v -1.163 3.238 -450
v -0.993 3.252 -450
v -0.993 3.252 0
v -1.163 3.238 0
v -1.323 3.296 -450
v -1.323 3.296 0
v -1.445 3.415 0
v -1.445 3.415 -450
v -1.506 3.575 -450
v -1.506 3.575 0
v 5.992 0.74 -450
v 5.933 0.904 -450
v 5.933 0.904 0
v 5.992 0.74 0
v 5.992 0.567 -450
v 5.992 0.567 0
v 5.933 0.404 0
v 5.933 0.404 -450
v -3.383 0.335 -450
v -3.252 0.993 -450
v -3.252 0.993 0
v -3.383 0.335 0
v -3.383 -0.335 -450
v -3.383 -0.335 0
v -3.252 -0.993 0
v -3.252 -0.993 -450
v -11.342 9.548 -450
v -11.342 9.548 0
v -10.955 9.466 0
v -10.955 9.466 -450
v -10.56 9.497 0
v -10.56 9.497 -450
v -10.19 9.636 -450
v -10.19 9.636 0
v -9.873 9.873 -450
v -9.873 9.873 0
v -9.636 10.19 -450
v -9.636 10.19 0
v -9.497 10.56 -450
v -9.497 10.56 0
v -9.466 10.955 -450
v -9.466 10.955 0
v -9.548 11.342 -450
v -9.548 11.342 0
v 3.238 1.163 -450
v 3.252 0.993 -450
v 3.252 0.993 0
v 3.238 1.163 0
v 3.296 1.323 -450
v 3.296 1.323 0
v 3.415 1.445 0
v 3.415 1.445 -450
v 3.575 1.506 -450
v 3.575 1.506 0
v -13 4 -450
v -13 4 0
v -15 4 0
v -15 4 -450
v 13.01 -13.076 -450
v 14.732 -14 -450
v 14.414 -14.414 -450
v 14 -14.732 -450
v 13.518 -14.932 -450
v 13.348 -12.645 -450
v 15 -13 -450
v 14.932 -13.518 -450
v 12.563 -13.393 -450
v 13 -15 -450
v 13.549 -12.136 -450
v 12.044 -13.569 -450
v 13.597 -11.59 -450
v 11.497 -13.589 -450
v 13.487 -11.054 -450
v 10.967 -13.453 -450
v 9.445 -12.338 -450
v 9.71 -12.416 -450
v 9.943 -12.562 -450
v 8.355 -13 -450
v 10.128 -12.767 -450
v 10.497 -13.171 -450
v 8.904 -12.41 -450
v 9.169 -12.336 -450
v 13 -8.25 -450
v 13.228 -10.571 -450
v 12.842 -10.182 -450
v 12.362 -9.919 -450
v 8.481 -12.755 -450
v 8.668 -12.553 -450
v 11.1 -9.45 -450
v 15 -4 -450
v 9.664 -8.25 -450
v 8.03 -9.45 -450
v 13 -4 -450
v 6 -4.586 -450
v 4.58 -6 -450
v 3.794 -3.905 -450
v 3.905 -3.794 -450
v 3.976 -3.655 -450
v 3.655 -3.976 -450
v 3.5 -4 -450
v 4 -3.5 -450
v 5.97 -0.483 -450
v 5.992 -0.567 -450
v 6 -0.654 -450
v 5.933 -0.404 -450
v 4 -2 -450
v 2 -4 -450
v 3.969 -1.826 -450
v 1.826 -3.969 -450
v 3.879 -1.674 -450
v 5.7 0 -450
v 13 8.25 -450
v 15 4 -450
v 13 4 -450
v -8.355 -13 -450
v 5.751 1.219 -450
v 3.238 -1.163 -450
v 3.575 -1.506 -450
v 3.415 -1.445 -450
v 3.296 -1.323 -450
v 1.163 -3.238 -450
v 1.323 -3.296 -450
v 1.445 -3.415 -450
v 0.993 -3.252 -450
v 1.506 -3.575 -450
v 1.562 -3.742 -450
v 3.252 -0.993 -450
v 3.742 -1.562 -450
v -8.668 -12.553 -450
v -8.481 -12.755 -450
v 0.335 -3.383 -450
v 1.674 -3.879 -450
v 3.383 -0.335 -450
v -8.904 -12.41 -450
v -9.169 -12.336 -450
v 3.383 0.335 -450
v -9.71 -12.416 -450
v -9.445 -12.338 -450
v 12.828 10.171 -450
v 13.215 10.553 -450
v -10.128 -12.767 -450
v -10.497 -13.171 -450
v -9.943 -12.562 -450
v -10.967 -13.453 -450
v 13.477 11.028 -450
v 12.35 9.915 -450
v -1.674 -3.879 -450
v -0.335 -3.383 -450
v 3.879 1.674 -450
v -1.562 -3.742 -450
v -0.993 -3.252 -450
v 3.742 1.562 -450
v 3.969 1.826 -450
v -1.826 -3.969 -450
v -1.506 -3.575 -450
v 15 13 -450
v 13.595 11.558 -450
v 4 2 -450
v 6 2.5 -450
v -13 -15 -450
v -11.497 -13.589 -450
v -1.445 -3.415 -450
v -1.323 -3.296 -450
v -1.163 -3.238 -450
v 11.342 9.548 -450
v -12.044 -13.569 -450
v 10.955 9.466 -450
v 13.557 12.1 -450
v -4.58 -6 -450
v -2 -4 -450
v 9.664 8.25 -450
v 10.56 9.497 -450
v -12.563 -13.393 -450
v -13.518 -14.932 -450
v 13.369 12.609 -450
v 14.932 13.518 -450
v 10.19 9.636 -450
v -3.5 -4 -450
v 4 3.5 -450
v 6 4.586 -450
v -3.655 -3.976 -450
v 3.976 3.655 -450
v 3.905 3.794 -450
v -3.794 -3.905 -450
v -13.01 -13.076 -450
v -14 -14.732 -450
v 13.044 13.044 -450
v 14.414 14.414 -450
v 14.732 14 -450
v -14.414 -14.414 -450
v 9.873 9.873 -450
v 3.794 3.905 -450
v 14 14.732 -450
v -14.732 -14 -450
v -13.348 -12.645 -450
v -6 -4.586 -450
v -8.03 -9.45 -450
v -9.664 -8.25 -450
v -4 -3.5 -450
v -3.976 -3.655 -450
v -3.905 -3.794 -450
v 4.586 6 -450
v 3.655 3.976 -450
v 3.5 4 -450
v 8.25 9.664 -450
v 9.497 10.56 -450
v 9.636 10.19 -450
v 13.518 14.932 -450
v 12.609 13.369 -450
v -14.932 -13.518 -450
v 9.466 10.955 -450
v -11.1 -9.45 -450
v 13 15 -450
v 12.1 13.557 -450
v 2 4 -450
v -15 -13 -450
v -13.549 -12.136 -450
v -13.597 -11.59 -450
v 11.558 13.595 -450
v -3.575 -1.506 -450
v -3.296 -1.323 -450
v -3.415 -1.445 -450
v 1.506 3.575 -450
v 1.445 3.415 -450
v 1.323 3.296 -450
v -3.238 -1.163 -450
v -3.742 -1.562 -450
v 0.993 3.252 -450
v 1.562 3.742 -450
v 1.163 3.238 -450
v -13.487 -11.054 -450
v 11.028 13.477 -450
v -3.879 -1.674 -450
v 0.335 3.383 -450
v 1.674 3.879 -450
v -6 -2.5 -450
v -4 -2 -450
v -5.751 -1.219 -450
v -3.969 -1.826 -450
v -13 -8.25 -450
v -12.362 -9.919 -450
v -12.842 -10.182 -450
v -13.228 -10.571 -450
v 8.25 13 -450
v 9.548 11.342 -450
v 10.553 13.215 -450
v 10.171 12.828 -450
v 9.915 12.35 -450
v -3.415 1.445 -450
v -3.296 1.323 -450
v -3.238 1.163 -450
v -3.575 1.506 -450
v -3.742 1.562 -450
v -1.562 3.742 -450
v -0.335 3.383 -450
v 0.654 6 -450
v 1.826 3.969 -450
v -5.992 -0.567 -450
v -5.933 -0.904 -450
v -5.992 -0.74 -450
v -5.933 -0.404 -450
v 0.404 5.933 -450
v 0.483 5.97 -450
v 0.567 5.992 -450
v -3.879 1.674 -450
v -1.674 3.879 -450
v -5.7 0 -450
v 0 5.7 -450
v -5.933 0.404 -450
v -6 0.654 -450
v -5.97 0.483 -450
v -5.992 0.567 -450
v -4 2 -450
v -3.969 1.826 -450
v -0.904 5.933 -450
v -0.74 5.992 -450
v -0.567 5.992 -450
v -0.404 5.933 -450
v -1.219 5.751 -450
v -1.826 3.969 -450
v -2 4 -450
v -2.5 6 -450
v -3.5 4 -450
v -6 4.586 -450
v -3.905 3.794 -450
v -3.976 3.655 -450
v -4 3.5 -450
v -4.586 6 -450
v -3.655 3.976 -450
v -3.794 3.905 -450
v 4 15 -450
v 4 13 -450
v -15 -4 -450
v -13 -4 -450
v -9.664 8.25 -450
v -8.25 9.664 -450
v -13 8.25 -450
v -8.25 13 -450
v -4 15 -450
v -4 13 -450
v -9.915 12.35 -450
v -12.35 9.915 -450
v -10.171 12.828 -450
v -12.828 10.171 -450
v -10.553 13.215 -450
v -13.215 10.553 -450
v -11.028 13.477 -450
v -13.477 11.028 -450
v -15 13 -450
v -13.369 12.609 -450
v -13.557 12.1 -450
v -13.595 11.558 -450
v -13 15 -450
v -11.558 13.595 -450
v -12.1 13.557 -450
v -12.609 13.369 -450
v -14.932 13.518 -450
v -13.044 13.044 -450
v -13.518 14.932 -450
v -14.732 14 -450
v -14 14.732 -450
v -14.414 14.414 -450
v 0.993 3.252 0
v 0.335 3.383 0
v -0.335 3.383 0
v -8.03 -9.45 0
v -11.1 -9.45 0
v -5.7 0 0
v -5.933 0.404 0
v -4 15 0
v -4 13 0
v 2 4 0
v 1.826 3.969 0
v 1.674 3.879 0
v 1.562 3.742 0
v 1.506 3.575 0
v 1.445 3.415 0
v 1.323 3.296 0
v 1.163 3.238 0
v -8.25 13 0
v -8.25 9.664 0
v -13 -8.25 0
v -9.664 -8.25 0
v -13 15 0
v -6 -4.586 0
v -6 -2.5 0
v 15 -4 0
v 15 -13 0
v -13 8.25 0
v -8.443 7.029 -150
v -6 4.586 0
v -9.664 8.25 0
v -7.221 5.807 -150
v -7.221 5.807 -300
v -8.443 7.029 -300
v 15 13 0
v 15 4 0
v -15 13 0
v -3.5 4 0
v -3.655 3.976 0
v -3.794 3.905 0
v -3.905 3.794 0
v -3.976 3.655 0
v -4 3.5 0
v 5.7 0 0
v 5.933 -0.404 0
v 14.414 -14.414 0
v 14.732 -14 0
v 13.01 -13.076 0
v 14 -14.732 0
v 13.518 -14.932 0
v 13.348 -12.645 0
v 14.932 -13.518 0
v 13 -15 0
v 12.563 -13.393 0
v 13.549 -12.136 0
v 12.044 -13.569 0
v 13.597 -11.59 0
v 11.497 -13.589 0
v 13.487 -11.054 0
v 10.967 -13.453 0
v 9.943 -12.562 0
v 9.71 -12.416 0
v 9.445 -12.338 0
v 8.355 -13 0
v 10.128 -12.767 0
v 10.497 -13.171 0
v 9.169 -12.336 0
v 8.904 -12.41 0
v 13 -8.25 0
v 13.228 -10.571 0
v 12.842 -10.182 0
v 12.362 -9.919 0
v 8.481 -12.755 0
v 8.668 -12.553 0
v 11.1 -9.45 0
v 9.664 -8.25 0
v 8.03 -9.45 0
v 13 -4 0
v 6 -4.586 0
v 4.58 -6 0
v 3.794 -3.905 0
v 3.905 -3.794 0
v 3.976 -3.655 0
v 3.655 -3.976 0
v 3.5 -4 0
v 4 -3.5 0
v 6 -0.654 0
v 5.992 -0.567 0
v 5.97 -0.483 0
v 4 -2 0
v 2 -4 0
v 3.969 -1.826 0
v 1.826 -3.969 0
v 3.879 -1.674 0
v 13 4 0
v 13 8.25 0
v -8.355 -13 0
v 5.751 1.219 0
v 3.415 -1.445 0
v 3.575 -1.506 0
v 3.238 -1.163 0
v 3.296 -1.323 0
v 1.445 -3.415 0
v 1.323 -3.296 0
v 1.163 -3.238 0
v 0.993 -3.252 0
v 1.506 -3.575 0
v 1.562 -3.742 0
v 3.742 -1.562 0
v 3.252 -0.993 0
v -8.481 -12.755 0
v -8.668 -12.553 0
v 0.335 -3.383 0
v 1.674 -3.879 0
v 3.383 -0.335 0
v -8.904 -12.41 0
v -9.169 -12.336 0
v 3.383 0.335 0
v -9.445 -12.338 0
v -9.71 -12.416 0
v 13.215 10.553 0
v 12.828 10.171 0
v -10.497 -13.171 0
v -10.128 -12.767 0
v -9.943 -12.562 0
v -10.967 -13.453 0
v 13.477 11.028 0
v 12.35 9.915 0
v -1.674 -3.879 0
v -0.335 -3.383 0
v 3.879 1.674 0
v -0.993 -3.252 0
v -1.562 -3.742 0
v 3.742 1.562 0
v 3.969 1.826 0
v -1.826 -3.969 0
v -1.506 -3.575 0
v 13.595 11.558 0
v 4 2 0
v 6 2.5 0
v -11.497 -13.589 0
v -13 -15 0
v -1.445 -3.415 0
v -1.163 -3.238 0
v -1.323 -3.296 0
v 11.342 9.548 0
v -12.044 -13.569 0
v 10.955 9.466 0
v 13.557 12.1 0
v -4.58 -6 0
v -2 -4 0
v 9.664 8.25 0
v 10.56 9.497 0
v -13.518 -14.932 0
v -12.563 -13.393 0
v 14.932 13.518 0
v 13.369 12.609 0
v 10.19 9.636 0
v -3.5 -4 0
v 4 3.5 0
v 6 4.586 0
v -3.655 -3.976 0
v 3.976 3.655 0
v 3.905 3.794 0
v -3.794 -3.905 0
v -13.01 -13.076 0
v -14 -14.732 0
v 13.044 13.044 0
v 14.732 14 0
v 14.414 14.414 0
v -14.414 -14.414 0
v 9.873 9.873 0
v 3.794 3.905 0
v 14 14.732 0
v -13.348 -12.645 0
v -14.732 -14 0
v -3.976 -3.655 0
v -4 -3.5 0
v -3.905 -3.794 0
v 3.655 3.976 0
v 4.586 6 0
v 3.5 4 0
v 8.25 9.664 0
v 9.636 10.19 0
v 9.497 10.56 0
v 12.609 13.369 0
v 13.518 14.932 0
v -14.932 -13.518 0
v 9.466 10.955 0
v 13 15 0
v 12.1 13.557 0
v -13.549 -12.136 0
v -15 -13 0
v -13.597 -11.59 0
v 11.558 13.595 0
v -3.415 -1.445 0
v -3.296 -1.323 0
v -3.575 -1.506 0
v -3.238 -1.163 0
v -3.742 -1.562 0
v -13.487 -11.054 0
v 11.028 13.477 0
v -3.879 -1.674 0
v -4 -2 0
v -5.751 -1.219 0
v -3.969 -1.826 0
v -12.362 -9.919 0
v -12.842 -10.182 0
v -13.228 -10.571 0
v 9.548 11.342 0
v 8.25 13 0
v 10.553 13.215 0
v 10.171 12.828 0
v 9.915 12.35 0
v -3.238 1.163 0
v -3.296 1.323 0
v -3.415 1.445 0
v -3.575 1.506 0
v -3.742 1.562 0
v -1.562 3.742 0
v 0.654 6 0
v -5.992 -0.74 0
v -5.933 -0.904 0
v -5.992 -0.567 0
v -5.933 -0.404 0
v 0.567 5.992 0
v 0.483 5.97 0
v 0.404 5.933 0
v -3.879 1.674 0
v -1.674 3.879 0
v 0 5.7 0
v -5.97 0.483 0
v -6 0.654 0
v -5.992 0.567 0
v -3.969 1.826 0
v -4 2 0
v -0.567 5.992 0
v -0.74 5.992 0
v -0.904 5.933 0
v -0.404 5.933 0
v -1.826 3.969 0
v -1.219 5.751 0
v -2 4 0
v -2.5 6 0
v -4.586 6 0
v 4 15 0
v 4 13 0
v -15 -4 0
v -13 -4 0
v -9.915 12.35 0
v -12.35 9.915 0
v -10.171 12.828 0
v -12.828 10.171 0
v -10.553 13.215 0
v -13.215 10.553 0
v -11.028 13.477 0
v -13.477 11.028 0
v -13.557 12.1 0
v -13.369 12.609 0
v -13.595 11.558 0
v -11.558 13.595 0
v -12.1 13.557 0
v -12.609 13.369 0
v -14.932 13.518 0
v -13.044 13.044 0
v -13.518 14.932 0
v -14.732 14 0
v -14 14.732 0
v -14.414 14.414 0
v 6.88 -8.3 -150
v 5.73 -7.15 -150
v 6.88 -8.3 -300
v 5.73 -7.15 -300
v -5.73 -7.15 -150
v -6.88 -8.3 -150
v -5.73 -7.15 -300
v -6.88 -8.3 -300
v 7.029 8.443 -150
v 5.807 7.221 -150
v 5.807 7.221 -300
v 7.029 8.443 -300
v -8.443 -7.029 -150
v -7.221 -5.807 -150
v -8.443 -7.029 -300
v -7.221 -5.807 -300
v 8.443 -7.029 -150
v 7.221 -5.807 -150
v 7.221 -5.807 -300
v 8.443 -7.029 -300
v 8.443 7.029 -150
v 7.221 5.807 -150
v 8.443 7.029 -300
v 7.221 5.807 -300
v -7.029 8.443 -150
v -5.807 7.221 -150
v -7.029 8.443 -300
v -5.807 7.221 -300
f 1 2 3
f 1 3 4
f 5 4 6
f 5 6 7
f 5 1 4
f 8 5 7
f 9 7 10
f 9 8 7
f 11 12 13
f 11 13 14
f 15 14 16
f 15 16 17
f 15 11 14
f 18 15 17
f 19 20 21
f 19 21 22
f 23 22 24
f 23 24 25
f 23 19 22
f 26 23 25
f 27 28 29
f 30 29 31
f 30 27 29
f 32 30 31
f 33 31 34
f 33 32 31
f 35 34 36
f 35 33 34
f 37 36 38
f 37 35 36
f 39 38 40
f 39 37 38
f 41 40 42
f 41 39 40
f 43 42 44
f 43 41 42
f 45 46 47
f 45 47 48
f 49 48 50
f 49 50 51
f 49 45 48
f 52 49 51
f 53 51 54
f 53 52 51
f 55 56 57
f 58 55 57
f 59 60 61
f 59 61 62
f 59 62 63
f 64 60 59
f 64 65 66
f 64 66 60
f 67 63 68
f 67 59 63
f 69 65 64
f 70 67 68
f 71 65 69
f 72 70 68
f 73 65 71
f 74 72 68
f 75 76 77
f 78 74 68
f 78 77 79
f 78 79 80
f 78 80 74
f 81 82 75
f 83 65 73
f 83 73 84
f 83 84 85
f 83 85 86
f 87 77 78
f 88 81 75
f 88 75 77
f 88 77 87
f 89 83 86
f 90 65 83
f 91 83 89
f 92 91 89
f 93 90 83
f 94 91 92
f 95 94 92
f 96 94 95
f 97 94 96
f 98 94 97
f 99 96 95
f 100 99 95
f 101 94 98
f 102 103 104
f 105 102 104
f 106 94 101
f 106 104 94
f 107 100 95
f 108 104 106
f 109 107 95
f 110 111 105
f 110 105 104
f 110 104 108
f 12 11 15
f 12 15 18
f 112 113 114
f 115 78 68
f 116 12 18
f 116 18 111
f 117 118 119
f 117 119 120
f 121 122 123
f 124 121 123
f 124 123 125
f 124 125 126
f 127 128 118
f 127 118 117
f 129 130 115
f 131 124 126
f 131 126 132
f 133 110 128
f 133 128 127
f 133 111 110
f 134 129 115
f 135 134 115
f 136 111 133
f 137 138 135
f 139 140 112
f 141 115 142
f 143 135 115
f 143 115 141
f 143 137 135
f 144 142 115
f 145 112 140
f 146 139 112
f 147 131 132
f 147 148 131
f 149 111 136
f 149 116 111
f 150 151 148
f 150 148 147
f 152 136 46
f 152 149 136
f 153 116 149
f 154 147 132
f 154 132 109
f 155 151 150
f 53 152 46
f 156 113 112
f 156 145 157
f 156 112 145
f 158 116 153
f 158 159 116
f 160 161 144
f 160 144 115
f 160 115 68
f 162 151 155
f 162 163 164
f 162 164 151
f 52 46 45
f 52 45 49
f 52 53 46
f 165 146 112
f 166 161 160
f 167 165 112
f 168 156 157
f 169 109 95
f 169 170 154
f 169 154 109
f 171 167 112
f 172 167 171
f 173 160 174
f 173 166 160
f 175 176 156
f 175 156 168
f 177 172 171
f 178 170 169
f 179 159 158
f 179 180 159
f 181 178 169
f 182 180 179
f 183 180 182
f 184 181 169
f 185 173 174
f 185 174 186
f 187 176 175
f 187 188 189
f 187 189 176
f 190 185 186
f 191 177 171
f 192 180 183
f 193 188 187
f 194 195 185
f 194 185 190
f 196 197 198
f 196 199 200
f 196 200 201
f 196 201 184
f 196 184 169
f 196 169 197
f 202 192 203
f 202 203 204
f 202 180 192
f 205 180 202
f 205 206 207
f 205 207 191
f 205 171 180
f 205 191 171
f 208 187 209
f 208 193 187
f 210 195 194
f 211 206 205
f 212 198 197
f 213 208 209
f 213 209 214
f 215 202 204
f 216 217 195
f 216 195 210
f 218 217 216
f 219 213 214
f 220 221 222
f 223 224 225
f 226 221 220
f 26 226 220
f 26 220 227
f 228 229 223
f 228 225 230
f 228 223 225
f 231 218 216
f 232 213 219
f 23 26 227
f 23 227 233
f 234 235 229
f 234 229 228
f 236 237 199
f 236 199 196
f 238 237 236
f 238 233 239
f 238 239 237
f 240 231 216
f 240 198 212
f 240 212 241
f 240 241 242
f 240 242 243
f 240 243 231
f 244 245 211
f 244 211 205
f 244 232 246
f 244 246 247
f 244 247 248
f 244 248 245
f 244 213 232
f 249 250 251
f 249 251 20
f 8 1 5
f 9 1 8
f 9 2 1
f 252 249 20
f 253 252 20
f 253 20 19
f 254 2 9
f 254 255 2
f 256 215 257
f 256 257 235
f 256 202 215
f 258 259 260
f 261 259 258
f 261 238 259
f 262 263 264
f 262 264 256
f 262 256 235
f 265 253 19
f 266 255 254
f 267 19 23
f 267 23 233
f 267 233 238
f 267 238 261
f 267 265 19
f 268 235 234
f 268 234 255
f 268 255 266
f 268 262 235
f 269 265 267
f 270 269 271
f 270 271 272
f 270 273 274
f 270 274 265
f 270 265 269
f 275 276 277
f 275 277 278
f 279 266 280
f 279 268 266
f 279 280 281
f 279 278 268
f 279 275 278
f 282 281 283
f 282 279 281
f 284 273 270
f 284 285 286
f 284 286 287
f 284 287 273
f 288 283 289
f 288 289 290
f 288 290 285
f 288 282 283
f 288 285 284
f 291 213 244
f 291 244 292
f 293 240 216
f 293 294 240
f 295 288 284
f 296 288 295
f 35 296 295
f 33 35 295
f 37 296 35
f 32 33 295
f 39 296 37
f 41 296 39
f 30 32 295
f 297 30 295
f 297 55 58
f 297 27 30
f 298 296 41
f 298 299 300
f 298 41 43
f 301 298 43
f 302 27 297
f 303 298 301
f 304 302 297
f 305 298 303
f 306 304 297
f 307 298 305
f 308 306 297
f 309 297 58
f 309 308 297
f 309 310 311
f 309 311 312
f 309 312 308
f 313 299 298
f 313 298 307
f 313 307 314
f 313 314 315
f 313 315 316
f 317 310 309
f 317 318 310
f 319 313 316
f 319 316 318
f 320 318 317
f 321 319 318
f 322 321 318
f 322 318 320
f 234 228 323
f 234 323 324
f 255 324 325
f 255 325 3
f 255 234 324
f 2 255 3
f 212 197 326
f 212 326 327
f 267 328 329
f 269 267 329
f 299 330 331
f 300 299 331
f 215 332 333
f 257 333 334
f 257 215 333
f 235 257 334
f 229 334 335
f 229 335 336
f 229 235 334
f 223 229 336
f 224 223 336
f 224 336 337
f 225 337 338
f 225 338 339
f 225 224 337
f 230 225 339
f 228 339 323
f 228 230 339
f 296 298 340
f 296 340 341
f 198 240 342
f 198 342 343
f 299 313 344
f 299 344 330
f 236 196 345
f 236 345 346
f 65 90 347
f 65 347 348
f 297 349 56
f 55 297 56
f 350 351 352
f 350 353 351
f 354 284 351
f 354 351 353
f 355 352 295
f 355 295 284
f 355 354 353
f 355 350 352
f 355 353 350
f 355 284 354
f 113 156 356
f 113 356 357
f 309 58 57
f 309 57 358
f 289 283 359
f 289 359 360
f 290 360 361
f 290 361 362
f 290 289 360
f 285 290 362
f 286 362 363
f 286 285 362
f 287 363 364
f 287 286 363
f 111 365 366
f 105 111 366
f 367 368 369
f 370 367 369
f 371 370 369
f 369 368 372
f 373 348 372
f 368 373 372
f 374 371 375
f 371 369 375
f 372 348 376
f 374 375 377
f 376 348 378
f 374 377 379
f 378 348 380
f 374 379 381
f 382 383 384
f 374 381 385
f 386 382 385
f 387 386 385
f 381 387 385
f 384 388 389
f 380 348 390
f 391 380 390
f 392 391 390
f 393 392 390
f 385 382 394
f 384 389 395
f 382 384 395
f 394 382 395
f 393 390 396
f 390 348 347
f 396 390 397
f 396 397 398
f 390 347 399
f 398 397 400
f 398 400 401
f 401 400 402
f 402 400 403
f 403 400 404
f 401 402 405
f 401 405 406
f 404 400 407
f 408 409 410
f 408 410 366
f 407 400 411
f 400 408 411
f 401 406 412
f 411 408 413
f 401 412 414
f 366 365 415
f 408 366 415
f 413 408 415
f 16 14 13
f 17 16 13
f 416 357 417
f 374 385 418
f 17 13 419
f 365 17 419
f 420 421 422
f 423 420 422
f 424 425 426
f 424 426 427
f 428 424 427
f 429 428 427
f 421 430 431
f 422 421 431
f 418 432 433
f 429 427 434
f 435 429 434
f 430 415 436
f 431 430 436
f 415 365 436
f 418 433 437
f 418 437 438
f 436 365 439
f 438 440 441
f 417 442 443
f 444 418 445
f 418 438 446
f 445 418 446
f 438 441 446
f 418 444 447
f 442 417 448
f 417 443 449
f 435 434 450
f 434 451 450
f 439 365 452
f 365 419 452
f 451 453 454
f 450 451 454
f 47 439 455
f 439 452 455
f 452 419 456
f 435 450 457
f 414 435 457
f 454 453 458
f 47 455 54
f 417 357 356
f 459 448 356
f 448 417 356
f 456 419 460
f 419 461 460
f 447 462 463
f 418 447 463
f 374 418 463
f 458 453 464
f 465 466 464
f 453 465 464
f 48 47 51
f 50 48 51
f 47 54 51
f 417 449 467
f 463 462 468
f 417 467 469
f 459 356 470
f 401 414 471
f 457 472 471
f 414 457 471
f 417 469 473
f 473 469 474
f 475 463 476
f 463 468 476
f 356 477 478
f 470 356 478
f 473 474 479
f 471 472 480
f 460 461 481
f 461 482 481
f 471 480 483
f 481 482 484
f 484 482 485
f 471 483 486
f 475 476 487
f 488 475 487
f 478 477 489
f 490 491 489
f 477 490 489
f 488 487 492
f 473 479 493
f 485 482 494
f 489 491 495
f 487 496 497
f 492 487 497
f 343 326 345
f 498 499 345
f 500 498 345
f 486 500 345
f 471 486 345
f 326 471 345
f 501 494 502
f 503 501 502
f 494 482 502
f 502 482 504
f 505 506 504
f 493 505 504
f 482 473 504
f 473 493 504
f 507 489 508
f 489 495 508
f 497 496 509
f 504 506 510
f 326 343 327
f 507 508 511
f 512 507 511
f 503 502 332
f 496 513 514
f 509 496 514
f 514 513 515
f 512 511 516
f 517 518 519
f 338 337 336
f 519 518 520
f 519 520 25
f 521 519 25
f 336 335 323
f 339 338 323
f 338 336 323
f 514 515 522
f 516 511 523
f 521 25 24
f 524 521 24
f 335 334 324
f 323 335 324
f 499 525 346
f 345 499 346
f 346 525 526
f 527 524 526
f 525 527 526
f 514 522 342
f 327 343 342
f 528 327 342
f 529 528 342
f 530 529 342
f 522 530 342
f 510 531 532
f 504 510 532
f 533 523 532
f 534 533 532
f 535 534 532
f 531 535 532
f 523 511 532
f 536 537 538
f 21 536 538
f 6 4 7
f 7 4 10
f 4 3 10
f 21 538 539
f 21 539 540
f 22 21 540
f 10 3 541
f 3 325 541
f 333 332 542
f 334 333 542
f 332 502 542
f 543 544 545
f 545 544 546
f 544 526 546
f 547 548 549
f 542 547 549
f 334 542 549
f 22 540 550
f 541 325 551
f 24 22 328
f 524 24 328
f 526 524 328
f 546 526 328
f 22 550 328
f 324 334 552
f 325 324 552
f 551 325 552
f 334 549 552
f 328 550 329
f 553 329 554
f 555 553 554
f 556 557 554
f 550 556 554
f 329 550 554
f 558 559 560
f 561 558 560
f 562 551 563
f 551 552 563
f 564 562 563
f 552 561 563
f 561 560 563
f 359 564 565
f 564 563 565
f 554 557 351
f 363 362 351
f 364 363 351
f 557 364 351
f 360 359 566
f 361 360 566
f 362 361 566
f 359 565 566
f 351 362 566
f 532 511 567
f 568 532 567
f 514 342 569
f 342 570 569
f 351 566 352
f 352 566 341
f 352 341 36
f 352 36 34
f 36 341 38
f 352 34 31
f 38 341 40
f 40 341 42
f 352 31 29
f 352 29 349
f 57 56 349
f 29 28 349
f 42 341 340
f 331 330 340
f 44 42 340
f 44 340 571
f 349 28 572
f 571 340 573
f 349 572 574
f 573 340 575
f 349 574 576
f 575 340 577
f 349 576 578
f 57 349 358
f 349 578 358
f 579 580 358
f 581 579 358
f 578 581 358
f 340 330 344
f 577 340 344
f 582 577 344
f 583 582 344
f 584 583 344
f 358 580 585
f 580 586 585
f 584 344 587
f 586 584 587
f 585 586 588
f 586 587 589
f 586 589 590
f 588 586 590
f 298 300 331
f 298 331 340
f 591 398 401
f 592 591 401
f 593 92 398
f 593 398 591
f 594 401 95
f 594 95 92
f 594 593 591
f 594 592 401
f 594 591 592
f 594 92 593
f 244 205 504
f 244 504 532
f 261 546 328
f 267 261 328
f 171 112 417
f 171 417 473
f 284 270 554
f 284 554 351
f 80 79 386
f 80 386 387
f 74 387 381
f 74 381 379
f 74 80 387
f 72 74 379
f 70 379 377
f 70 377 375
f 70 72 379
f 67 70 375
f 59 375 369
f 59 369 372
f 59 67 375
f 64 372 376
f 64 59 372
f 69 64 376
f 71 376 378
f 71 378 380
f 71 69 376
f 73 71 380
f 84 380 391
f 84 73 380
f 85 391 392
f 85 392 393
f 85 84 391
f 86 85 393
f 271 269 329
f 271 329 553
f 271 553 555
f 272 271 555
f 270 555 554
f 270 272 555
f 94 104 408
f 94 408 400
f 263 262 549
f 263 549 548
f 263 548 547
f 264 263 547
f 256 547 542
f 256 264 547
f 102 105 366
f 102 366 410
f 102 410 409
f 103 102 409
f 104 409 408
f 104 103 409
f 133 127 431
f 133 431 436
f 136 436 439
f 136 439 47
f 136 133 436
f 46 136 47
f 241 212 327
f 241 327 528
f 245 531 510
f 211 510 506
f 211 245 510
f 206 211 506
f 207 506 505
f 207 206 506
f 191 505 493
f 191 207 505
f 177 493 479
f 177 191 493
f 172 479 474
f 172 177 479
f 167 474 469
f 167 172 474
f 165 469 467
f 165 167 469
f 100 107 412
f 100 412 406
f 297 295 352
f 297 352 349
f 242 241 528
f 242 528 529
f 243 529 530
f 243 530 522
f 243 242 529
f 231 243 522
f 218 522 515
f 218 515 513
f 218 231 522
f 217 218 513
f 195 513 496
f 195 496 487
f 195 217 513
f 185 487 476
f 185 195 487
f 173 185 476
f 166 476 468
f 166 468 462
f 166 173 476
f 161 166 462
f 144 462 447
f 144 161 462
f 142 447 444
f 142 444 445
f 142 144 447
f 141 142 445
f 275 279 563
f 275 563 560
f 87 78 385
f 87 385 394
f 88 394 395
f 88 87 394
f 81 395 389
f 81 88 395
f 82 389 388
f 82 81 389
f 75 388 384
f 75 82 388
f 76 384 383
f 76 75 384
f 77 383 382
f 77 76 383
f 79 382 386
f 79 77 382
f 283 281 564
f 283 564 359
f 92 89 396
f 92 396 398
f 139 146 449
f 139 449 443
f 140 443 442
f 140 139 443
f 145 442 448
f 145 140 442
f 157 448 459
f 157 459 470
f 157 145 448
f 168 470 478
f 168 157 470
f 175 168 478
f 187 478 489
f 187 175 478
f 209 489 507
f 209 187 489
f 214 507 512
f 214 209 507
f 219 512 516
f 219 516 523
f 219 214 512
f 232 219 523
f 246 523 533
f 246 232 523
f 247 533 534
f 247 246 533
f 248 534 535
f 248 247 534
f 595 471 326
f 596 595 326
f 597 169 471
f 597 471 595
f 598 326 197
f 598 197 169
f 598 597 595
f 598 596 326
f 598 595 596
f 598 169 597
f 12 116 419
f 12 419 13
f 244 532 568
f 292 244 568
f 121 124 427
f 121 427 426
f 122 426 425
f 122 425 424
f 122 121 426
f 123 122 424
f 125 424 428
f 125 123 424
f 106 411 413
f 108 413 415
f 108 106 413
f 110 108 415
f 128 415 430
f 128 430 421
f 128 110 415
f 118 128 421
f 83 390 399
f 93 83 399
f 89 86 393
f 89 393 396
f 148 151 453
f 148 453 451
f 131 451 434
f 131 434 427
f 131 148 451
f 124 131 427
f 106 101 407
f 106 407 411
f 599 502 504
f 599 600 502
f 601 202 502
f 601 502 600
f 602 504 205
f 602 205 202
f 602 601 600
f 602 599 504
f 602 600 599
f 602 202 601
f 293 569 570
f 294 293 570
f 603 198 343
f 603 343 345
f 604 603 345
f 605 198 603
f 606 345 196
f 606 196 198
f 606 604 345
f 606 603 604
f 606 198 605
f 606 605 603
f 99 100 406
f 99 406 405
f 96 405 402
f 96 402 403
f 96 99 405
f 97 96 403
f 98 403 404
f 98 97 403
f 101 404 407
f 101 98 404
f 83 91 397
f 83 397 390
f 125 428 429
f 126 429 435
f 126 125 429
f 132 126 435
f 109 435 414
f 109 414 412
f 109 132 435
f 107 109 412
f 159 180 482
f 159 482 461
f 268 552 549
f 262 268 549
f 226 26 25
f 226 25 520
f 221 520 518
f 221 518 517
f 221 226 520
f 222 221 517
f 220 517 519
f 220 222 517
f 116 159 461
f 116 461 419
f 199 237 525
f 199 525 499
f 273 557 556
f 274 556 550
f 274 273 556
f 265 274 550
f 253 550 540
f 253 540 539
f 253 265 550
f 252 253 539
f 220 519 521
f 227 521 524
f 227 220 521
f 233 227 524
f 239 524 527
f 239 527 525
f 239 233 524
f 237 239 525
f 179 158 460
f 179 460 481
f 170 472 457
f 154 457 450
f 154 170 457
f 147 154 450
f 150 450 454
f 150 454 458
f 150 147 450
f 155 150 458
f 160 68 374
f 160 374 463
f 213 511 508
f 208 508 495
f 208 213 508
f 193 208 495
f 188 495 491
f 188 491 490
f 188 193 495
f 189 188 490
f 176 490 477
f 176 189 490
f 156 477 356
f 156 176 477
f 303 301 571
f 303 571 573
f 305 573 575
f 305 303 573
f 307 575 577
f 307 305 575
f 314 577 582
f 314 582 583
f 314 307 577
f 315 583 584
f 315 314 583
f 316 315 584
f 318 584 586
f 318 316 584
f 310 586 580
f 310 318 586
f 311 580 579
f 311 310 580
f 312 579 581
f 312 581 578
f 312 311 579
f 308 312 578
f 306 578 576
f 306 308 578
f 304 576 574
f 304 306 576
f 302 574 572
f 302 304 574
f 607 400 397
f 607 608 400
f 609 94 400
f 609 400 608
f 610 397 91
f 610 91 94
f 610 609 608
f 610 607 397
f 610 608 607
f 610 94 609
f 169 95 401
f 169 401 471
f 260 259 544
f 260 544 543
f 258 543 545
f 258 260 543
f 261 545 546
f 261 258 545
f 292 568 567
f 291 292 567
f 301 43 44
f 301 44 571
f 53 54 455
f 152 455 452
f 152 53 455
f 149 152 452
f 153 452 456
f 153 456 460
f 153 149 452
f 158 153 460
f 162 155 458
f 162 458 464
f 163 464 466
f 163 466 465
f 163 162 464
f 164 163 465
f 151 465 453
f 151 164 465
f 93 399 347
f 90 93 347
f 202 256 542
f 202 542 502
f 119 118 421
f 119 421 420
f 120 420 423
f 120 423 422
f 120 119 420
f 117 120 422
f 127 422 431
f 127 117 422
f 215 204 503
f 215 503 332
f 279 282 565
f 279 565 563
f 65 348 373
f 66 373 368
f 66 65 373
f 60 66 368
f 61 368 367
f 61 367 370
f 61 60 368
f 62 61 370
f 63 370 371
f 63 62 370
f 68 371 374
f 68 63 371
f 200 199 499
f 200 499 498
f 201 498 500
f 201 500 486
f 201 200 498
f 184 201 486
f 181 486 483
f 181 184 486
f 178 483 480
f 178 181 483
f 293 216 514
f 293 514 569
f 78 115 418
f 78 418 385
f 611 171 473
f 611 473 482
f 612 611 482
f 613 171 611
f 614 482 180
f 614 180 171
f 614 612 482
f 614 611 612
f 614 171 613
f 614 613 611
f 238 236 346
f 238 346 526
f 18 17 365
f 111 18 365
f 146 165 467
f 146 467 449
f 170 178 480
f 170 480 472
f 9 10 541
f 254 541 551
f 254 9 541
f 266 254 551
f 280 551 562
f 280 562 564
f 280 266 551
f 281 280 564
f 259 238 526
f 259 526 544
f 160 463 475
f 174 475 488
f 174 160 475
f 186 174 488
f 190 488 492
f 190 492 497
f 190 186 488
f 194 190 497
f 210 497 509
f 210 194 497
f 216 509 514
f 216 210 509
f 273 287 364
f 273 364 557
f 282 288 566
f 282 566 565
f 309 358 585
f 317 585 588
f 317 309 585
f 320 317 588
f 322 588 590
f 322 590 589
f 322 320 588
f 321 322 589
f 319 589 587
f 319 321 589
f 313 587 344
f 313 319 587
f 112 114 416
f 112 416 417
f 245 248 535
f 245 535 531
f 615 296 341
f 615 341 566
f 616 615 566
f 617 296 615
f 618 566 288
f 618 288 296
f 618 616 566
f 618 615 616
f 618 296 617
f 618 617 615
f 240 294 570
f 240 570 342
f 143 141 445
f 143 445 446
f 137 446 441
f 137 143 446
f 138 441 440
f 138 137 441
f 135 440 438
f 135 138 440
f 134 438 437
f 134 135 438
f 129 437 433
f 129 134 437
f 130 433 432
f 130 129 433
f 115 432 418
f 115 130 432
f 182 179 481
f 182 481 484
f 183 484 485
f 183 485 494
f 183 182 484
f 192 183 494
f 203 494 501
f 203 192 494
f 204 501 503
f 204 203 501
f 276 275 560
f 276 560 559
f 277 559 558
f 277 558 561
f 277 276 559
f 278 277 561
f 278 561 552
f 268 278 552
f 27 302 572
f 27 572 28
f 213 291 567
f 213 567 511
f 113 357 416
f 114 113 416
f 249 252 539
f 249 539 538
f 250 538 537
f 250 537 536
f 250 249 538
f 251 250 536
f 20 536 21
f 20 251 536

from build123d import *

# Parameters (mm, degrees)
ESTRUSIONE_ESTRUSIONE1_DEPTH = 450


with BuildPart() as part:
    # Schizzo1 → Estrusione-Estrusione1 (new body)
    with BuildSketch(Plane(origin=(0, 0, -450), x_dir=(-1, 0, 0), z_dir=(0, 0, -1))):
        with BuildLine():
            Line((-15, -4), (-15, -13))
            ThreePointArc((-15, -13), (-14.414213562, -14.414213562), (-13, -15))
            Line((-13, -15), (13, -15))
            ThreePointArc((13, -15), (14.414213562, -14.414213562), (15, -13))
            Line((15, -13), (15, -4))
            Line((15, -4), (13, -4))
            Line((13, -4), (13, -8.25))
            Line((13, -8.25), (9.664213562, -8.25))
            add(Edge.make_bspline(
                [(9.664213562, -8.25), (8.442809042, -7.028595479), (7.221404521, -5.807190958), (6, -4.585786438)],
                knots=[0, 0, 0, 0, 1, 1, 1, 1], degree=3))
            Line((6, -4.585786438), (6, -2.5))
            Line((6, -2.5), (5.750976629, -1.218885816))
            Line((5.750976629, -1.218885816), (5.933012788, -0.90358969))
            ThreePointArc((5.933012788, -0.90358969), (6, -0.653589753), (5.933012702, -0.403589838))
            Line((5.933012702, -0.403589838), (5.7, 0))
            Line((5.7, 0), (5.933012702, 0.403589838))
            ThreePointArc((5.933012702, 0.403589838), (5.982962913, 0.524180316), (6, 0.653589838))
            Line((6, 0.653589838), (6, 4.585786438))
            add(Edge.make_bspline(
                [(6, 4.585786438), (7.221404521, 5.807190958), (8.442809042, 7.028595479), (9.664213562, 8.25)],
                knots=[0, 0, 0, 0, 1, 1, 1, 1], degree=3))
            Line((9.664213562, 8.25), (13, 8.25))
            Line((13, 8.25), (13, 4))
            Line((13, 4), (15, 4))
            Line((15, 4), (15, 13))
            ThreePointArc((15, 13), (14.414213562, 14.414213562), (13, 15))
            Line((13, 15), (4, 15))
            Line((4, 15), (4, 13))
            Line((4, 13), (8.25, 13))
            Line((8.25, 13), (8.25, 9.664213562))
            add(Edge.make_bspline(
                [(8.25, 9.664213562), (7.028595479, 8.442809042), (5.807190958, 7.221404521), (4.585786438, 6)],
                knots=[0, 0, 0, 0, 1, 1, 1, 1], degree=3))
            Line((4.585786438, 6), (2.5, 6))
            Line((2.5, 6), (1.218885629, 5.750976592))
            Line((1.218885629, 5.750976592), (0.903589838, 5.933012702))
            ThreePointArc((0.903589838, 5.933012702), (0.653589838, 6), (0.403589838, 5.933012702))
            Line((0.403589838, 5.933012702), (0, 5.7))
            Line((0, 5.7), (-0.403589838, 5.933012702))
            ThreePointArc((-0.403589838, 5.933012702), (-0.524180316, 5.982962913), (-0.653589838, 6))
            Line((-0.653589838, 6), (-4.585786438, 6))
            add(Edge.make_bspline(
                [(-4.585786438, 6), (-5.807190958, 7.221404521), (-7.028595479, 8.442809042), (-8.25, 9.664213562)],
                knots=[0, 0, 0, 0, 1, 1, 1, 1], degree=3))
            Line((-8.25, 9.664213562), (-8.25, 13))
            Line((-8.25, 13), (-4, 13))
            Line((-4, 13), (-4, 15))
            Line((-4, 15), (-13, 15))
            ThreePointArc((-13, 15), (-14.414213562, 14.414213562), (-15, 13))
            Line((-15, 13), (-15, 4))
            Line((-15, 4), (-13, 4))
            Line((-13, 4), (-13, 8.25))
            Line((-13, 8.25), (-9.664213562, 8.25))
            add(Edge.make_bspline(
                [(-9.664213562, 8.25), (-8.442809042, 7.028595479), (-7.221404521, 5.807190958), (-6, 4.585786438)],
                knots=[0, 0, 0, 0, 1, 1, 1, 1], degree=3))
            Line((-6, 4.585786438), (-6, 2.5))
            Line((-6, 2.5), (-5.750976592, 1.218885629))
            Line((-5.750976592, 1.218885629), (-5.933012702, 0.903589838))
            ThreePointArc((-5.933012702, 0.903589838), (-6, 0.653589838), (-5.933012702, 0.403589838))
            Line((-5.933012702, 0.403589838), (-5.7, 0))
            Line((-5.7, 0), (-5.933012702, -0.403589838))
            ThreePointArc((-5.933012702, -0.403589838), (-5.982962913, -0.524180316), (-6, -0.653589838))
            Line((-6, -0.653589838), (-6, -4.585786438))
            add(Edge.make_bspline(
                [(-6, -4.585786438), (-7.221404521, -5.807190958), (-8.442809042, -7.028595479), (-9.664213562, -8.25)],
                knots=[0, 0, 0, 0, 1, 1, 1, 1], degree=3))
            Line((-9.664213562, -8.25), (-13, -8.25))
            Line((-13, -8.25), (-13, -4))
            Line((-13, -4), (-15, -4))
        make_face()
        with BuildLine():
            Line((12.349838066, 9.914583088), (11.34224826, 9.54785039))
            ThreePointArc((11.34224826, 9.54785039), (9.873470565, 9.873470565), (9.54785039, 11.34224826))
            Line((9.54785039, 11.34224826), (9.914583088, 12.349838066))
            ThreePointArc((9.914583088, 12.349838066), (13.043502884, 13.043502884), (12.349838066, 9.914583088))
        make_face(mode=Mode.SUBTRACT)
        with BuildLine():
            Line((-4.58, -6), (4.58, -6))
            add(Edge.make_bspline(
                [(4.58, -6), (5.73, -7.15), (6.88, -8.3), (8.03, -9.45)],
                knots=[0, 0, 0, 0, 1, 1, 1, 1], degree=3))
            Line((8.03, -9.45), (11.1, -9.45))
            Line((11.1, -9.45), (12.361944654, -9.919036981))
            ThreePointArc((12.361944654, -9.919036981), (13.194761433, -12.872897378), (10.127586207, -12.766543418))
            ThreePointArc((10.127586207, -12.766543418), (9.169403304, -12.336446483), (8.355281336, -13))
            Line((8.355281336, -13), (-8.355281336, -13))
            ThreePointArc((-8.355281336, -13), (-9.169403304, -12.336446483), (-10.127586207, -12.766543418))
            ThreePointArc((-10.127586207, -12.766543418), (-13.194761433, -12.872897378), (-12.361944654, -9.919036981))
            Line((-12.361944654, -9.919036981), (-11.1, -9.45))
            Line((-11.1, -9.45), (-8.03, -9.45))
            add(Edge.make_bspline(
                [(-8.03, -9.45), (-6.88, -8.3), (-5.73, -7.15), (-4.58, -6)],
                knots=[0, 0, 0, 0, 1, 1, 1, 1], degree=3))
        make_face(mode=Mode.SUBTRACT)
        with BuildLine():
            Line((-11.34224826, 9.54785039), (-12.349838066, 9.914583088))
            ThreePointArc((-12.349838066, 9.914583088), (-13.043502884, 13.043502884), (-9.914583088, 12.349838066))
            Line((-9.914583088, 12.349838066), (-9.54785039, 11.34224826))
            ThreePointArc((-9.54785039, 11.34224826), (-9.873470565, 9.873470565), (-11.34224826, 9.54785039))
        make_face(mode=Mode.SUBTRACT)
        with BuildLine():
            Line((4, 3.5), (4, 2))
            ThreePointArc((4, 2), (3.879005736, 1.673879391), (3.574581393, 1.505593673))
            ThreePointArc((3.574581393, 1.505593673), (3.295837094, 1.323326833), (3.251694243, 0.993219284))
            ThreePointArc((3.251694243, 0.993219284), (3.4, 0), (3.251694243, -0.993219284))
            ThreePointArc((3.251694243, -0.993219284), (3.295837094, -1.323326833), (3.574581393, -1.505593673))
            ThreePointArc((3.574581393, -1.505593673), (3.879005736, -1.673879391), (4, -2))
            Line((4, -2), (4, -3.5))
            ThreePointArc((4, -3.5), (3.853553391, -3.853553391), (3.5, -4))
            Line((3.5, -4), (2, -4))
            ThreePointArc((2, -4), (1.673879391, -3.879005736), (1.505593673, -3.574581393))
            ThreePointArc((1.505593673, -3.574581393), (1.323326833, -3.295837094), (0.993219284, -3.251694243))
            ThreePointArc((0.993219284, -3.251694243), (0, -3.4), (-0.993219284, -3.251694243))
            ThreePointArc((-0.993219284, -3.251694243), (-1.323326833, -3.295837094), (-1.505593673, -3.574581393))
            ThreePointArc((-1.505593673, -3.574581393), (-1.673879391, -3.879005736), (-2, -4))
            Line((-2, -4), (-3.5, -4))
            ThreePointArc((-3.5, -4), (-3.853553391, -3.853553391), (-4, -3.5))
            Line((-4, -3.5), (-4, -2))
            ThreePointArc((-4, -2), (-3.879005736, -1.673879391), (-3.574581393, -1.505593673))
            ThreePointArc((-3.574581393, -1.505593673), (-3.295837094, -1.323326833), (-3.251694243, -0.993219284))
            ThreePointArc((-3.251694243, -0.993219284), (-3.4, 0), (-3.251694243, 0.993219284))
            ThreePointArc((-3.251694243, 0.993219284), (-3.295837094, 1.323326833), (-3.574581393, 1.505593673))
            ThreePointArc((-3.574581393, 1.505593673), (-3.879005736, 1.673879391), (-4, 2))
            Line((-4, 2), (-4, 3.5))
            ThreePointArc((-4, 3.5), (-3.853553391, 3.853553391), (-3.5, 4))
            Line((-3.5, 4), (-2, 4))
            ThreePointArc((-2, 4), (-1.673879391, 3.879005736), (-1.505593673, 3.574581393))
            ThreePointArc((-1.505593673, 3.574581393), (-1.323326833, 3.295837094), (-0.993219284, 3.251694243))
            ThreePointArc((-0.993219284, 3.251694243), (0, 3.4), (0.993219284, 3.251694243))
            ThreePointArc((0.993219284, 3.251694243), (1.323326833, 3.295837094), (1.505593673, 3.574581393))
            ThreePointArc((1.505593673, 3.574581393), (1.673879391, 3.879005736), (2, 4))
            Line((2, 4), (3.5, 4))
            ThreePointArc((3.5, 4), (3.853553391, 3.853553391), (4, 3.5))
        make_face(mode=Mode.SUBTRACT)
    extrude(amount=-ESTRUSIONE_ESTRUSIONE1_DEPTH)


solid = part.part
